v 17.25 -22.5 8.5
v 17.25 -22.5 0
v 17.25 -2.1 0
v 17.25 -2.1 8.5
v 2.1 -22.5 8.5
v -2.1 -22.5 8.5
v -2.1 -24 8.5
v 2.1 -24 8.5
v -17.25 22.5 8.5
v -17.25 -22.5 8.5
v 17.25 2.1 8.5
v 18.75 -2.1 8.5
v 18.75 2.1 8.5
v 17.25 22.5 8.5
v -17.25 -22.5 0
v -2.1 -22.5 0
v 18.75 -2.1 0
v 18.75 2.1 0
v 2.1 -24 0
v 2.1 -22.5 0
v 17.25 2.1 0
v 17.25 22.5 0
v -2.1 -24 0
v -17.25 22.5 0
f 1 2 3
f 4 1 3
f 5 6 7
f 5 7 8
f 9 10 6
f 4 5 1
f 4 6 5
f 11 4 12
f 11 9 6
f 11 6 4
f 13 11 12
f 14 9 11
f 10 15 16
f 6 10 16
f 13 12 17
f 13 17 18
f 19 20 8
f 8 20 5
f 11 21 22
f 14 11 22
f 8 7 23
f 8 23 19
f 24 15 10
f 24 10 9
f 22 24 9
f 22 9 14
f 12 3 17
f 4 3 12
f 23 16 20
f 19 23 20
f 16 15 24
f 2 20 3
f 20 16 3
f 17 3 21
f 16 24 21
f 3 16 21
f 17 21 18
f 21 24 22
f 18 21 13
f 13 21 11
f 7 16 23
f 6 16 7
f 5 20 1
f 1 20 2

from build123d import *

# Parameters (mm, degrees)
SKETCH_W     = 34.5
SKETCH_H     = 45
PAD_DEPTH    = 8.5
SKETCH001_W  = 4.2
SKETCH001_H  = 8.5
PAD001_DEPTH = 1.5
SKETCH002_W  = 4.2
SKETCH002_H  = 8.5
PAD002_DEPTH = 1.5


with BuildPart() as part:
    # Sketch → Pad (new body)
    with BuildSketch(Plane.XY):
        Rectangle(SKETCH_W, SKETCH_H)
    extrude(amount=PAD_DEPTH)

    # Sketch001 (on Face3 of Pad) → Pad001 (join)
    with BuildSketch(Plane.YZ.offset(17.25)):
        with Locations((0, 4.25)):
            Rectangle(SKETCH001_W, SKETCH001_H)
    extrude(amount=PAD001_DEPTH)

    # Sketch002 (on Face2 of Pad) → Pad002 (join)
    with BuildSketch(Plane.XZ.offset(22.5)):
        with Locations((0, 4.25)):
            Rectangle(SKETCH002_W, SKETCH002_H)
    extrude(amount=PAD002_DEPTH)


solid = part.part
